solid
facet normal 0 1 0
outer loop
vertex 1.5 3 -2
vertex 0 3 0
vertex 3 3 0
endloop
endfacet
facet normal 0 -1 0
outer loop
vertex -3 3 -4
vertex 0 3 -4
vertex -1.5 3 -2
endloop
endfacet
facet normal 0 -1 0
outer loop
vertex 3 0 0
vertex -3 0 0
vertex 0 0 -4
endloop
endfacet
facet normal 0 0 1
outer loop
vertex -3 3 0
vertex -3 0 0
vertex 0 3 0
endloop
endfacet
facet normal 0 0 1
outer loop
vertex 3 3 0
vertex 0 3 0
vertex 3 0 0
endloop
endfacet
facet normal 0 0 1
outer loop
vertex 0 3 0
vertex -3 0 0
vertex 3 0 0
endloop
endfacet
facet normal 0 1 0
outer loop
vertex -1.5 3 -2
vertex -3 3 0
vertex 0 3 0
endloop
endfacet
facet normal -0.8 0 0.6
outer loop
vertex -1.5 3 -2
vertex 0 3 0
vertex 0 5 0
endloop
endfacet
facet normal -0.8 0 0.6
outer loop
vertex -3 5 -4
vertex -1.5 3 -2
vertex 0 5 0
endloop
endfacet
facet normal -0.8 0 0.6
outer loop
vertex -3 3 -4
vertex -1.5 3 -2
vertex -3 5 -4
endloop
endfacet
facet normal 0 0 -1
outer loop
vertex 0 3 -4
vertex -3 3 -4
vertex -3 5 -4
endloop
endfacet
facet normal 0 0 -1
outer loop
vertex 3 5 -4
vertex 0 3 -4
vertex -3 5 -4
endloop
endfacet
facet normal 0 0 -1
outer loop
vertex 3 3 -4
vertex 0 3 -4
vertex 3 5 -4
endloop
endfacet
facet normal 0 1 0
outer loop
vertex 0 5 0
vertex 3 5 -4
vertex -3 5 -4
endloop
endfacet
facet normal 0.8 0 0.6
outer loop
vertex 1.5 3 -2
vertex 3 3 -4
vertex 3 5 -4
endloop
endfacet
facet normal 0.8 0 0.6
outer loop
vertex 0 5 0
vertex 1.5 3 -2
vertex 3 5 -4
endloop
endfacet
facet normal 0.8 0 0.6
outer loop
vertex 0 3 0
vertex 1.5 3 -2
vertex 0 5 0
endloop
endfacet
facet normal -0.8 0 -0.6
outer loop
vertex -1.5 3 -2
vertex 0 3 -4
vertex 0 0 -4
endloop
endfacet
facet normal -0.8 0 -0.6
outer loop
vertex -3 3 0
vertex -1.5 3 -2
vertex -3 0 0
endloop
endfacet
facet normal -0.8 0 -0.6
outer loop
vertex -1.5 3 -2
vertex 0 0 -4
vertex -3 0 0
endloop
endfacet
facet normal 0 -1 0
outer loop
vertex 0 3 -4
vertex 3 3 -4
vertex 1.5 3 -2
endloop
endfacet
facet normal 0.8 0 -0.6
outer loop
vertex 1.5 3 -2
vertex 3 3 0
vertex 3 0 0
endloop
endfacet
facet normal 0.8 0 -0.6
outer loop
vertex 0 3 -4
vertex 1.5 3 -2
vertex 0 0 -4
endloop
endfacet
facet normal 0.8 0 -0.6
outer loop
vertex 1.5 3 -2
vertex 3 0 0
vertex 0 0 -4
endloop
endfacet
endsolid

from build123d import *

# Parameters (mm, degrees)
BOSS_EXTRUDE1_DEPTH = 3
BOSS_EXTRUDE2_DEPTH = 2


with BuildPart() as part:
    # Sketch1 → Boss-Extrude1 (new body)
    with BuildSketch(Plane(origin=(0, 0, 0), x_dir=(1, 0, 0), z_dir=(0, 1, 0))):
        Polygon((0, 4), (-3, 0), (3, 0), align=None)
    extrude(amount=BOSS_EXTRUDE1_DEPTH)

    # Sketch2 → Boss-Extrude2 (add)
    with BuildSketch(Plane(origin=(0, 3, 0), x_dir=(1, 0, 0), z_dir=(0, 1, 0))):
        Polygon((0, 0), (-3, 4), (3, 4), align=None)
    extrude(amount=BOSS_EXTRUDE2_DEPTH)


solid = part.part
